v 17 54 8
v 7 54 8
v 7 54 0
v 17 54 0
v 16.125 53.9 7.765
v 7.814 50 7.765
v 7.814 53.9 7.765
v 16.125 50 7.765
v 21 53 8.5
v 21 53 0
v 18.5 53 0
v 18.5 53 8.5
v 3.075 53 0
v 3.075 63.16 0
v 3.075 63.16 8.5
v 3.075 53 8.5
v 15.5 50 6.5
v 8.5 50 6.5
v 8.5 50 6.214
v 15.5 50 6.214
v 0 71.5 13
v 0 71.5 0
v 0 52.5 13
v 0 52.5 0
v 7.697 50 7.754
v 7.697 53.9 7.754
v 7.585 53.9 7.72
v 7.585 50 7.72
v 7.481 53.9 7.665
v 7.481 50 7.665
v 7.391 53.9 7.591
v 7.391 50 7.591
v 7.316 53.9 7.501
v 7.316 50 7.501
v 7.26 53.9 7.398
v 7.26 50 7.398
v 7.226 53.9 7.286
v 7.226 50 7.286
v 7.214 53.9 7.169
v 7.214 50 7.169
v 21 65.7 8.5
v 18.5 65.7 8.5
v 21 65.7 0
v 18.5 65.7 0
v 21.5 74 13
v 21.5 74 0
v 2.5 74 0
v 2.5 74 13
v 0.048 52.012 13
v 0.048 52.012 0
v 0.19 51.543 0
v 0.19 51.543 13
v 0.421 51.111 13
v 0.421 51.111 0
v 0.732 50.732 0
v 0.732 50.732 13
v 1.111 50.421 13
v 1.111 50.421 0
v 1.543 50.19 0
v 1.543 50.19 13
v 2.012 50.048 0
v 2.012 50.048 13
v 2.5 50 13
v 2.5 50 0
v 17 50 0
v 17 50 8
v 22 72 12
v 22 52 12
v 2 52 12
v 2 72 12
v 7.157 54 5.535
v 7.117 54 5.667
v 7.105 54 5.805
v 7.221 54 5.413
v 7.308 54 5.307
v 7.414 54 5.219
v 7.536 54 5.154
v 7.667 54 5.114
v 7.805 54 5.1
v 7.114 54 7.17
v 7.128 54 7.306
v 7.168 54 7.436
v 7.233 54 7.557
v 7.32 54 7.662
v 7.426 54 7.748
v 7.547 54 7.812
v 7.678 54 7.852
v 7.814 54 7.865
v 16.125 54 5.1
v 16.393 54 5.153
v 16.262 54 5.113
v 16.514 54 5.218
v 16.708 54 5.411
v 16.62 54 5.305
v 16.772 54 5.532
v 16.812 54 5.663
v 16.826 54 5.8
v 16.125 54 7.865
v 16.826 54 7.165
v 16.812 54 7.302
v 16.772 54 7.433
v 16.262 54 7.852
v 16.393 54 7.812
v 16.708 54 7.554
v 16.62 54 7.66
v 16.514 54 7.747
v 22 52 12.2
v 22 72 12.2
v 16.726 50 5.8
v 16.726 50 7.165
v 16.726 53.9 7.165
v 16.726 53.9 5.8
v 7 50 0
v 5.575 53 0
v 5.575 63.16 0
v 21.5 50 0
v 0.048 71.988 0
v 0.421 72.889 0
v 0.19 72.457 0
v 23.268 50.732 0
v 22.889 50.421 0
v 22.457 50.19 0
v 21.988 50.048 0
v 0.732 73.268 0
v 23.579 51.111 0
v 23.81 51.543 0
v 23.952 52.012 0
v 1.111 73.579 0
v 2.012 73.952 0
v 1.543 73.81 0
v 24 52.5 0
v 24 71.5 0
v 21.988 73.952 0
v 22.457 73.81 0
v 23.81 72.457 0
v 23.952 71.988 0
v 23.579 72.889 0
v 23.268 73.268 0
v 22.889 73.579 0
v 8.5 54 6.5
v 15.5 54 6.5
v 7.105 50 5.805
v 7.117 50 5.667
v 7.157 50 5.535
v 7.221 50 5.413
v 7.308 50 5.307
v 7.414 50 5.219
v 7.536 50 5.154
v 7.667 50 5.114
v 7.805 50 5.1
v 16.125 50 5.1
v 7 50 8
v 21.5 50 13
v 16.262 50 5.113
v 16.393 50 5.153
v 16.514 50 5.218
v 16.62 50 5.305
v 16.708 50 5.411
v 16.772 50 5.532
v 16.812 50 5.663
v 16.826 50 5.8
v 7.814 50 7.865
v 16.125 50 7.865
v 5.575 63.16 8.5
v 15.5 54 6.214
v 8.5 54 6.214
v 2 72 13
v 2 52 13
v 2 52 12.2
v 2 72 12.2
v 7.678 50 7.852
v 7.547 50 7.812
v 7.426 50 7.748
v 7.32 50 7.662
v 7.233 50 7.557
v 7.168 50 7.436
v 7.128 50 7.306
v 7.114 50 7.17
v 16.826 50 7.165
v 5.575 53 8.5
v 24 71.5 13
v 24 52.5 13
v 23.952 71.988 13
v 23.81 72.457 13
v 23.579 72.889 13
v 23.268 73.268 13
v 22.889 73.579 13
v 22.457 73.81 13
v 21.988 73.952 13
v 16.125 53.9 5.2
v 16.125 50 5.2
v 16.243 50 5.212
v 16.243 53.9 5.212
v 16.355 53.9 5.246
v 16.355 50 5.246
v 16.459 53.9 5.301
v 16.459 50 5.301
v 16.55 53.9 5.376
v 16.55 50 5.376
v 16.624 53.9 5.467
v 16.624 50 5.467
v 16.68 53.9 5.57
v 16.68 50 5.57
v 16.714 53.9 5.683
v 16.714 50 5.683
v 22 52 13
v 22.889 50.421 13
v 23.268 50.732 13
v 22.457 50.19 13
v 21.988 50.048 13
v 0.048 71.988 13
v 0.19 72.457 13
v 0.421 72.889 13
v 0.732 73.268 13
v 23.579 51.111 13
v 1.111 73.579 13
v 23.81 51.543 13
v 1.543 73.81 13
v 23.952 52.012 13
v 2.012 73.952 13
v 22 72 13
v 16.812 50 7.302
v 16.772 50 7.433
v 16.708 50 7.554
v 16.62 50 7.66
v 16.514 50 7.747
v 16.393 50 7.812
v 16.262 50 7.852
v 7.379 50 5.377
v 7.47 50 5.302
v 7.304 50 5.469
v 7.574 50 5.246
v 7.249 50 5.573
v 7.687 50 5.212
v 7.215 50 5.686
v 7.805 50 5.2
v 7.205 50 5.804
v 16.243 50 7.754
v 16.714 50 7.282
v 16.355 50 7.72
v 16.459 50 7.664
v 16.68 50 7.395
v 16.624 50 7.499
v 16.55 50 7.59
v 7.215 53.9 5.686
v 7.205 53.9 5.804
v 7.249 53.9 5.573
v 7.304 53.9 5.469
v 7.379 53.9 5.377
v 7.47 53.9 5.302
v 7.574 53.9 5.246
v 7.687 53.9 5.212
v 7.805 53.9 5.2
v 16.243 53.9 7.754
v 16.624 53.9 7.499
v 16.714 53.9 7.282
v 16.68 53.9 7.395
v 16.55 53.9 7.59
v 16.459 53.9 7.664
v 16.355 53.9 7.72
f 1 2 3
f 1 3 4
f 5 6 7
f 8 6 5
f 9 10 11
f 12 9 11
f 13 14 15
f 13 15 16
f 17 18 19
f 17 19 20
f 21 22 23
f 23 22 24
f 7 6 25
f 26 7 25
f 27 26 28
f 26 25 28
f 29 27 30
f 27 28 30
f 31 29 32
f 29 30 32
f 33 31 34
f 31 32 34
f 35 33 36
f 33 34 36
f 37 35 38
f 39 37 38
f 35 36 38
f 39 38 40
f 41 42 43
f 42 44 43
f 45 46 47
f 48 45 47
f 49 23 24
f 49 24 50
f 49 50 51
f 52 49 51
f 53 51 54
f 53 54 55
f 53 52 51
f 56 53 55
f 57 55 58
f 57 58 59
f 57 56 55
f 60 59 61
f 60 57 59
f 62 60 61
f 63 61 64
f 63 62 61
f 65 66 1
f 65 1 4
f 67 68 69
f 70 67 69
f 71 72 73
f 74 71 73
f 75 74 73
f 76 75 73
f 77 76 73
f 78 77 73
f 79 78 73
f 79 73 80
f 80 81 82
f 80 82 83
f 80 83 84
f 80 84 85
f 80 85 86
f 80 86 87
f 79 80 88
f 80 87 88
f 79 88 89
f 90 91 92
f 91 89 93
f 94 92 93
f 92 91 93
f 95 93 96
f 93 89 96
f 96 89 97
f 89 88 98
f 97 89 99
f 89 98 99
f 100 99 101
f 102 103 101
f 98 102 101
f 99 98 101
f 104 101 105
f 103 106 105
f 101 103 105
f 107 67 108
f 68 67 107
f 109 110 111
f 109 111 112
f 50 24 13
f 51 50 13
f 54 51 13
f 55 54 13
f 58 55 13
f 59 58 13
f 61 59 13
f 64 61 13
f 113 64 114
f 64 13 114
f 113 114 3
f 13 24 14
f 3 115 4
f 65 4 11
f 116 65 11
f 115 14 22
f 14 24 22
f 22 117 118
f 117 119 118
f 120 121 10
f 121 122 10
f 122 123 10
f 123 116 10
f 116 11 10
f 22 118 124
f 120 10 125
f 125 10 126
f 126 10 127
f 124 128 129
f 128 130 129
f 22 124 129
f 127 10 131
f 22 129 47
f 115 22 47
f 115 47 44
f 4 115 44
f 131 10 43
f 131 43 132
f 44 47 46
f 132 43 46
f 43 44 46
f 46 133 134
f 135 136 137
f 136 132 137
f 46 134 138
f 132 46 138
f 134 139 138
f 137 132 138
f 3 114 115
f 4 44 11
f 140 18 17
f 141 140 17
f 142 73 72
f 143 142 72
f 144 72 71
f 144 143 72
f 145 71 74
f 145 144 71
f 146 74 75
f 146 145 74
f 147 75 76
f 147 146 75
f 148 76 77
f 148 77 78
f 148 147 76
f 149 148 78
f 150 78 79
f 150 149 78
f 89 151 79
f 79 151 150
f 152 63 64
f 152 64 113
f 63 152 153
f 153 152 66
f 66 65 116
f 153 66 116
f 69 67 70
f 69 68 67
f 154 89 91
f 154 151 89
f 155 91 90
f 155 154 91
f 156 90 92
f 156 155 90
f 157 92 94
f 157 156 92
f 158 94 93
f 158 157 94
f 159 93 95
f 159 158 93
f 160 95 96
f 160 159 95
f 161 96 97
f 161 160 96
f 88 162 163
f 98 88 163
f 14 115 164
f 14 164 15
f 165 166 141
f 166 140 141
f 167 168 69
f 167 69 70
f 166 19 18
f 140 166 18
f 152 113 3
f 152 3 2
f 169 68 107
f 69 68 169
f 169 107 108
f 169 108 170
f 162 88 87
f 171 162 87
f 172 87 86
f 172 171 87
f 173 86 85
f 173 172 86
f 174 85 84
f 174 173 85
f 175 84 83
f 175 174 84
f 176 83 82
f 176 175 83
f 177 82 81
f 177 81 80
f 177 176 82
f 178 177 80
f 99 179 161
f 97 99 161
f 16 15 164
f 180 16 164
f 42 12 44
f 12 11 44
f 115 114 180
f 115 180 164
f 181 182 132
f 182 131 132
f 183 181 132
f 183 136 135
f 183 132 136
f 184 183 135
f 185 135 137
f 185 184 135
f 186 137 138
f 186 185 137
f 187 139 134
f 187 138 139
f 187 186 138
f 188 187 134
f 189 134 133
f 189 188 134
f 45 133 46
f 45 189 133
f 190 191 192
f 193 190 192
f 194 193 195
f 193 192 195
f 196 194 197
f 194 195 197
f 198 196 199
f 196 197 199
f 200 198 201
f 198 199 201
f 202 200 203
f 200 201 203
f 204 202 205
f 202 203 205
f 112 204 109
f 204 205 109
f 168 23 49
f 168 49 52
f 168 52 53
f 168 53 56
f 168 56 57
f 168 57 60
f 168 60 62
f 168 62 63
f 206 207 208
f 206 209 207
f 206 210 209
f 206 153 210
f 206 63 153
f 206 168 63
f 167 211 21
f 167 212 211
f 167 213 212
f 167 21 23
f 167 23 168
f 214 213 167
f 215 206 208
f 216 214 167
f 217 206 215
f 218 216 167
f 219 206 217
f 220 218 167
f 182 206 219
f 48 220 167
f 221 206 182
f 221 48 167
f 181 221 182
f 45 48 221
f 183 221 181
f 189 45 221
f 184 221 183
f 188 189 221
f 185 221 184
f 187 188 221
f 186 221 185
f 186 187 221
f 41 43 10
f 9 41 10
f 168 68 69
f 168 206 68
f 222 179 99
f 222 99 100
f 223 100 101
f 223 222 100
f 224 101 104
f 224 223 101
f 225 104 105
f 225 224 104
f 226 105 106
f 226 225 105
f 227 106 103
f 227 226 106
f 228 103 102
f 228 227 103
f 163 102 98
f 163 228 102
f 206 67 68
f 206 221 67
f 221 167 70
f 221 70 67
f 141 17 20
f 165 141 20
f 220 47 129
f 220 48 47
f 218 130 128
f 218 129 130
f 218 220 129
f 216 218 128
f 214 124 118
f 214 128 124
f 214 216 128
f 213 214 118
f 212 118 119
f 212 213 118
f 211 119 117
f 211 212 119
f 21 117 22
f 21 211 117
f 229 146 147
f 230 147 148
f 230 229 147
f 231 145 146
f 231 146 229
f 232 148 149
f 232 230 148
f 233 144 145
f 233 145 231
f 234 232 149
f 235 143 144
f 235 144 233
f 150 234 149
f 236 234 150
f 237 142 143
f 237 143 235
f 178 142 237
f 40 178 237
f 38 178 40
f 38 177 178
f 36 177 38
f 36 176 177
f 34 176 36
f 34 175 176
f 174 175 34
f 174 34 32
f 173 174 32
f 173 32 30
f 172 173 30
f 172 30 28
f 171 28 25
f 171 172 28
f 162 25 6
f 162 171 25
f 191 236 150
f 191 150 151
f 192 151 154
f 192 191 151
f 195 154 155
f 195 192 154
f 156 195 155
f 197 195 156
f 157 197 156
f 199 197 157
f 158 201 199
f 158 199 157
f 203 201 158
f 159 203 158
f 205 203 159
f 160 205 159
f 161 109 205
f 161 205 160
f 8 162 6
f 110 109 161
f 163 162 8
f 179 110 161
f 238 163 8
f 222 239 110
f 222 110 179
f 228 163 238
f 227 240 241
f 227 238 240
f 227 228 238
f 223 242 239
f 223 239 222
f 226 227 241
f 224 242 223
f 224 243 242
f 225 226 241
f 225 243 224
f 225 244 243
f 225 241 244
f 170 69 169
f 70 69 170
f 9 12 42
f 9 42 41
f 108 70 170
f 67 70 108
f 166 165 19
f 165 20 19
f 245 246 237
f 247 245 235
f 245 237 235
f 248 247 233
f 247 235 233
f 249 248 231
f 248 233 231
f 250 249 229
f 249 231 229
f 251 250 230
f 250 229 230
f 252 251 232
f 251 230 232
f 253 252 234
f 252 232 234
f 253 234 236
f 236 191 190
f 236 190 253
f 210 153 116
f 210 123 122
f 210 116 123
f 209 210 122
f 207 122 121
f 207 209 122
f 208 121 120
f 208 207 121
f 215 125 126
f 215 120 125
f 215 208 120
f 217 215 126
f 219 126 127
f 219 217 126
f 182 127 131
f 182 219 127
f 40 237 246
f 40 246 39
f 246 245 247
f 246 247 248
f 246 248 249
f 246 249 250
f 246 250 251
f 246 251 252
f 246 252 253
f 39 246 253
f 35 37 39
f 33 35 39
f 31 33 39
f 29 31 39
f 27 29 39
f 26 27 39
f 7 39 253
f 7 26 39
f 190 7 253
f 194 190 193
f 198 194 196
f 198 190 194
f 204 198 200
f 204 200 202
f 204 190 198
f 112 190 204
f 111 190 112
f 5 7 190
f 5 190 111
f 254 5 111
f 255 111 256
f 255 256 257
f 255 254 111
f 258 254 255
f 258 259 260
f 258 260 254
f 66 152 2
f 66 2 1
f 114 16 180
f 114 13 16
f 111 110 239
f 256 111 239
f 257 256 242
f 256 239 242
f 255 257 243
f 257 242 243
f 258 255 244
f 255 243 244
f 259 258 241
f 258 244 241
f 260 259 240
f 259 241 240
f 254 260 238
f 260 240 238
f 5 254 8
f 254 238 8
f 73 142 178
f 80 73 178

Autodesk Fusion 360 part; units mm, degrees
sketch "Esquisse1" plane through (0, 0, 0) normal (0, 0, 1) x (1, 0, 0)
  line L0 (0, 50) -> (24, 50)
  line L1 (24, 50) -> (24, 74)
  line L2 (24, 74) -> (0, 74)
  line L3 (0, 74) -> (0, 50)
  dimension "d1" = 24
  dimension "d2" = 24
extrude "Extrusion1" add sketch "Esquisse1" along normal blind 13 makes body 1
fillet "Congé1" radius 2.5 4 edges at (0, 50, 6.5) (24, 50, 6.5) (0, 74, 6.5) (24, 74, 6.5) on bodies 1
sketch "Esquisse2" plane through (0, 0, 13) normal (0, 0, 1) x (-1, 0, 0)
  arc A0 (-24, -71.5) -> (-21.5, -74) centre (-21.5, -71.5) ccw
  line L0 (-21.5, -74) -> (-2.5, -74)
  arc A1 (-2.5, -74) -> (0, -71.5) centre (-2.5, -71.5) ccw
  line L1 (0, -71.5) -> (0, -52.5)
  arc A2 (0, -52.5) -> (-2.5, -50) centre (-2.5, -52.5) ccw
  line L2 (-2.5, -50) -> (-21.5, -50)
  arc A3 (-21.5, -50) -> (-24, -52.5) centre (-21.5, -52.5) ccw
  line L3 (-24, -52.5) -> (-24, -71.5)
  line L4 (-2, -72) -> (-22, -72)
  line L5 (-22, -72) -> (-22, -52)
  line L6 (-22, -52) -> (-2, -52)
  line L7 (-2, -52) -> (-2, -72)
extrude "Extrusion2" cut sketch "Esquisse2" against normal blind 1 contours L4 L5 L6 L7 bodies 1
sketch "Esquisse4" plane through (0, 50, 0) normal (0, -1, 0) x (1, 0, 0)
  line L0 (21.5, 0) -> (21.5, 13)
  line L1 (21.5, 13) -> (2.5, 13)
  line L2 (2.5, 13) -> (2.5, 0)
  line L3 (2.5, 0) -> (21.5, 0)
  line L4 (12, 13) -> (12, 8) construction
  line L5 (7, 8) -> (17, 8)
  line L6 (17, 8) -> (17, 5)
  line L7 (17, 5) -> (7, 5)
  line L8 (7, 5) -> (7, 8)
  line L9 (7, 5) -> (17, 5)
  line L10 (17, 5) -> (17, 0)
  line L11 (17, 0) -> (7, 0)
  line L12 (7, 0) -> (7, 5)
  dimension "d9" = 5
  dimension "d10" = 10
  dimension "d11" = 3
extrude "Extrusion3" cut sketch "Esquisse4" against normal blind 4 contours L5 L6 L7 L8 L9 bodies 1
extrude "Extrusion4" cut sketch "Esquisse4" against normal blind 4 contours L3 L7 L9 L10 L11 L12 bodies 1
sketch "Esquisse5" plane through (0, 50, 0) normal (0, -1, 0) x (1, 0, 0)
  line L0 (7.8136, 7.8653) -> (16.1255, 7.8653)
  line L1 (16.8255, 7.1653) -> (16.8255, 5.8)
  line L2 (16.1255, 5.1) -> (7.8046, 5.1)
  line L3 (7.1046, 5.8046) -> (7.1136, 7.1699)
  line L4 (8.5, 6.5) -> (15.5, 6.5)
  line L5 (15.5, 6.5) -> (15.5, 6.2135)
  line L6 (15.5, 6.2135) -> (8.5, 6.2135)
  line L7 (8.5, 6.2135) -> (8.5, 6.5)
  arc A0 (7.8136, 7.8653) -> (7.1136, 7.1699) centre (7.8136, 7.1653) ccw
  arc A1 (7.1046, 5.8046) -> (7.8046, 5.1) centre (7.8046, 5.8) ccw
  arc A2 (16.8255, 7.1653) -> (16.1255, 7.8653) centre (16.1255, 7.1653) ccw
  arc A3 (16.1255, 5.1) -> (16.8255, 5.8) centre (16.1255, 5.8) ccw
  dimension "d18" = 0.7
extrude "Extrusion7" add sketch "Esquisse5" against normal blind 4 separate body contours L0 L1 L2 L3 A0 A1 A2 A3 | L4 L5 L6 L7 makes body 2
shell "Coque2" thickness 0.1 removed faces 1 at (10.5812, 50, 6.0218) on bodies 2
extrude "Extrusion8" add sketch "Esquisse5" against normal blind 4 separate body contours L4 L5 L6 L7 makes body 3
sketch "Esquisse6" plane through (0, 0, 0) normal (0, 0, -1) x (1, 0, 0)
  line L0 (17, -50) -> (17, -54)
  line L1 (17, -54) -> (7, -54)
  line L2 (7, -54) -> (7, -50)
  line L3 (7, -50) -> (2.5, -50)
  arc A0 (2.5, -50) -> (0, -52.5) centre (2.5, -52.5) ccw
  line L4 (0, -52.5) -> (0, -71.5)
  arc A1 (0, -71.5) -> (2.5, -74) centre (2.5, -71.5) ccw
  line L5 (2.5, -74) -> (21.5, -74)
  arc A2 (21.5, -74) -> (24, -71.5) centre (21.5, -71.5) ccw
  line L6 (24, -71.5) -> (24, -52.5)
  arc A3 (24, -52.5) -> (21.5, -50) centre (21.5, -52.5) ccw
  line L7 (21.5, -50) -> (17, -50)
  line L8 (0, -53) -> (3, -53)
  line L9 (3.0754, -50) -> (3.0754, -53)
  line L10 (3.0754, -53) -> (5.5754, -53)
  line L11 (5.5754, -53) -> (5.5754, -63.16)
  line L12 (5.5754, -63.16) -> (3.0754, -63.16)
  line L13 (3.0754, -63.16) -> (3.0754, -53)
  line L14 (24, -53) -> (21, -53)
  line L15 (21, -53) -> (18.5, -53)
  line L16 (18.5, -53) -> (18.5, -65.7)
  line L17 (18.5, -65.7) -> (21, -65.7)
  line L18 (21, -65.7) -> (21, -53)
  dimension "d27" = 3
  dimension "d28" = 3
  dimension "d29" = 2.5
  dimension "d30" = 10.16
  dimension "d31" = 3
  dimension "d32" = 2.5
  dimension "d33" = 12.7
extrude "Extrusion9" cut sketch "Esquisse6" against normal blind 8.5 contours L10 L11 L12 L13 | L15 L16 L17 L18 bodies 1
extrude "Extrusion10" add 1 faces at (8.6667, 65.3333, 12) along direction (0, 0, 1) blind 0.2 separate body on bodies 1 makes body 4
equation "d30 = ( 2.54 * 4 ) * 1 mm"
equation "d33 = ( 2.54 * 5 ) * 1 mm"
